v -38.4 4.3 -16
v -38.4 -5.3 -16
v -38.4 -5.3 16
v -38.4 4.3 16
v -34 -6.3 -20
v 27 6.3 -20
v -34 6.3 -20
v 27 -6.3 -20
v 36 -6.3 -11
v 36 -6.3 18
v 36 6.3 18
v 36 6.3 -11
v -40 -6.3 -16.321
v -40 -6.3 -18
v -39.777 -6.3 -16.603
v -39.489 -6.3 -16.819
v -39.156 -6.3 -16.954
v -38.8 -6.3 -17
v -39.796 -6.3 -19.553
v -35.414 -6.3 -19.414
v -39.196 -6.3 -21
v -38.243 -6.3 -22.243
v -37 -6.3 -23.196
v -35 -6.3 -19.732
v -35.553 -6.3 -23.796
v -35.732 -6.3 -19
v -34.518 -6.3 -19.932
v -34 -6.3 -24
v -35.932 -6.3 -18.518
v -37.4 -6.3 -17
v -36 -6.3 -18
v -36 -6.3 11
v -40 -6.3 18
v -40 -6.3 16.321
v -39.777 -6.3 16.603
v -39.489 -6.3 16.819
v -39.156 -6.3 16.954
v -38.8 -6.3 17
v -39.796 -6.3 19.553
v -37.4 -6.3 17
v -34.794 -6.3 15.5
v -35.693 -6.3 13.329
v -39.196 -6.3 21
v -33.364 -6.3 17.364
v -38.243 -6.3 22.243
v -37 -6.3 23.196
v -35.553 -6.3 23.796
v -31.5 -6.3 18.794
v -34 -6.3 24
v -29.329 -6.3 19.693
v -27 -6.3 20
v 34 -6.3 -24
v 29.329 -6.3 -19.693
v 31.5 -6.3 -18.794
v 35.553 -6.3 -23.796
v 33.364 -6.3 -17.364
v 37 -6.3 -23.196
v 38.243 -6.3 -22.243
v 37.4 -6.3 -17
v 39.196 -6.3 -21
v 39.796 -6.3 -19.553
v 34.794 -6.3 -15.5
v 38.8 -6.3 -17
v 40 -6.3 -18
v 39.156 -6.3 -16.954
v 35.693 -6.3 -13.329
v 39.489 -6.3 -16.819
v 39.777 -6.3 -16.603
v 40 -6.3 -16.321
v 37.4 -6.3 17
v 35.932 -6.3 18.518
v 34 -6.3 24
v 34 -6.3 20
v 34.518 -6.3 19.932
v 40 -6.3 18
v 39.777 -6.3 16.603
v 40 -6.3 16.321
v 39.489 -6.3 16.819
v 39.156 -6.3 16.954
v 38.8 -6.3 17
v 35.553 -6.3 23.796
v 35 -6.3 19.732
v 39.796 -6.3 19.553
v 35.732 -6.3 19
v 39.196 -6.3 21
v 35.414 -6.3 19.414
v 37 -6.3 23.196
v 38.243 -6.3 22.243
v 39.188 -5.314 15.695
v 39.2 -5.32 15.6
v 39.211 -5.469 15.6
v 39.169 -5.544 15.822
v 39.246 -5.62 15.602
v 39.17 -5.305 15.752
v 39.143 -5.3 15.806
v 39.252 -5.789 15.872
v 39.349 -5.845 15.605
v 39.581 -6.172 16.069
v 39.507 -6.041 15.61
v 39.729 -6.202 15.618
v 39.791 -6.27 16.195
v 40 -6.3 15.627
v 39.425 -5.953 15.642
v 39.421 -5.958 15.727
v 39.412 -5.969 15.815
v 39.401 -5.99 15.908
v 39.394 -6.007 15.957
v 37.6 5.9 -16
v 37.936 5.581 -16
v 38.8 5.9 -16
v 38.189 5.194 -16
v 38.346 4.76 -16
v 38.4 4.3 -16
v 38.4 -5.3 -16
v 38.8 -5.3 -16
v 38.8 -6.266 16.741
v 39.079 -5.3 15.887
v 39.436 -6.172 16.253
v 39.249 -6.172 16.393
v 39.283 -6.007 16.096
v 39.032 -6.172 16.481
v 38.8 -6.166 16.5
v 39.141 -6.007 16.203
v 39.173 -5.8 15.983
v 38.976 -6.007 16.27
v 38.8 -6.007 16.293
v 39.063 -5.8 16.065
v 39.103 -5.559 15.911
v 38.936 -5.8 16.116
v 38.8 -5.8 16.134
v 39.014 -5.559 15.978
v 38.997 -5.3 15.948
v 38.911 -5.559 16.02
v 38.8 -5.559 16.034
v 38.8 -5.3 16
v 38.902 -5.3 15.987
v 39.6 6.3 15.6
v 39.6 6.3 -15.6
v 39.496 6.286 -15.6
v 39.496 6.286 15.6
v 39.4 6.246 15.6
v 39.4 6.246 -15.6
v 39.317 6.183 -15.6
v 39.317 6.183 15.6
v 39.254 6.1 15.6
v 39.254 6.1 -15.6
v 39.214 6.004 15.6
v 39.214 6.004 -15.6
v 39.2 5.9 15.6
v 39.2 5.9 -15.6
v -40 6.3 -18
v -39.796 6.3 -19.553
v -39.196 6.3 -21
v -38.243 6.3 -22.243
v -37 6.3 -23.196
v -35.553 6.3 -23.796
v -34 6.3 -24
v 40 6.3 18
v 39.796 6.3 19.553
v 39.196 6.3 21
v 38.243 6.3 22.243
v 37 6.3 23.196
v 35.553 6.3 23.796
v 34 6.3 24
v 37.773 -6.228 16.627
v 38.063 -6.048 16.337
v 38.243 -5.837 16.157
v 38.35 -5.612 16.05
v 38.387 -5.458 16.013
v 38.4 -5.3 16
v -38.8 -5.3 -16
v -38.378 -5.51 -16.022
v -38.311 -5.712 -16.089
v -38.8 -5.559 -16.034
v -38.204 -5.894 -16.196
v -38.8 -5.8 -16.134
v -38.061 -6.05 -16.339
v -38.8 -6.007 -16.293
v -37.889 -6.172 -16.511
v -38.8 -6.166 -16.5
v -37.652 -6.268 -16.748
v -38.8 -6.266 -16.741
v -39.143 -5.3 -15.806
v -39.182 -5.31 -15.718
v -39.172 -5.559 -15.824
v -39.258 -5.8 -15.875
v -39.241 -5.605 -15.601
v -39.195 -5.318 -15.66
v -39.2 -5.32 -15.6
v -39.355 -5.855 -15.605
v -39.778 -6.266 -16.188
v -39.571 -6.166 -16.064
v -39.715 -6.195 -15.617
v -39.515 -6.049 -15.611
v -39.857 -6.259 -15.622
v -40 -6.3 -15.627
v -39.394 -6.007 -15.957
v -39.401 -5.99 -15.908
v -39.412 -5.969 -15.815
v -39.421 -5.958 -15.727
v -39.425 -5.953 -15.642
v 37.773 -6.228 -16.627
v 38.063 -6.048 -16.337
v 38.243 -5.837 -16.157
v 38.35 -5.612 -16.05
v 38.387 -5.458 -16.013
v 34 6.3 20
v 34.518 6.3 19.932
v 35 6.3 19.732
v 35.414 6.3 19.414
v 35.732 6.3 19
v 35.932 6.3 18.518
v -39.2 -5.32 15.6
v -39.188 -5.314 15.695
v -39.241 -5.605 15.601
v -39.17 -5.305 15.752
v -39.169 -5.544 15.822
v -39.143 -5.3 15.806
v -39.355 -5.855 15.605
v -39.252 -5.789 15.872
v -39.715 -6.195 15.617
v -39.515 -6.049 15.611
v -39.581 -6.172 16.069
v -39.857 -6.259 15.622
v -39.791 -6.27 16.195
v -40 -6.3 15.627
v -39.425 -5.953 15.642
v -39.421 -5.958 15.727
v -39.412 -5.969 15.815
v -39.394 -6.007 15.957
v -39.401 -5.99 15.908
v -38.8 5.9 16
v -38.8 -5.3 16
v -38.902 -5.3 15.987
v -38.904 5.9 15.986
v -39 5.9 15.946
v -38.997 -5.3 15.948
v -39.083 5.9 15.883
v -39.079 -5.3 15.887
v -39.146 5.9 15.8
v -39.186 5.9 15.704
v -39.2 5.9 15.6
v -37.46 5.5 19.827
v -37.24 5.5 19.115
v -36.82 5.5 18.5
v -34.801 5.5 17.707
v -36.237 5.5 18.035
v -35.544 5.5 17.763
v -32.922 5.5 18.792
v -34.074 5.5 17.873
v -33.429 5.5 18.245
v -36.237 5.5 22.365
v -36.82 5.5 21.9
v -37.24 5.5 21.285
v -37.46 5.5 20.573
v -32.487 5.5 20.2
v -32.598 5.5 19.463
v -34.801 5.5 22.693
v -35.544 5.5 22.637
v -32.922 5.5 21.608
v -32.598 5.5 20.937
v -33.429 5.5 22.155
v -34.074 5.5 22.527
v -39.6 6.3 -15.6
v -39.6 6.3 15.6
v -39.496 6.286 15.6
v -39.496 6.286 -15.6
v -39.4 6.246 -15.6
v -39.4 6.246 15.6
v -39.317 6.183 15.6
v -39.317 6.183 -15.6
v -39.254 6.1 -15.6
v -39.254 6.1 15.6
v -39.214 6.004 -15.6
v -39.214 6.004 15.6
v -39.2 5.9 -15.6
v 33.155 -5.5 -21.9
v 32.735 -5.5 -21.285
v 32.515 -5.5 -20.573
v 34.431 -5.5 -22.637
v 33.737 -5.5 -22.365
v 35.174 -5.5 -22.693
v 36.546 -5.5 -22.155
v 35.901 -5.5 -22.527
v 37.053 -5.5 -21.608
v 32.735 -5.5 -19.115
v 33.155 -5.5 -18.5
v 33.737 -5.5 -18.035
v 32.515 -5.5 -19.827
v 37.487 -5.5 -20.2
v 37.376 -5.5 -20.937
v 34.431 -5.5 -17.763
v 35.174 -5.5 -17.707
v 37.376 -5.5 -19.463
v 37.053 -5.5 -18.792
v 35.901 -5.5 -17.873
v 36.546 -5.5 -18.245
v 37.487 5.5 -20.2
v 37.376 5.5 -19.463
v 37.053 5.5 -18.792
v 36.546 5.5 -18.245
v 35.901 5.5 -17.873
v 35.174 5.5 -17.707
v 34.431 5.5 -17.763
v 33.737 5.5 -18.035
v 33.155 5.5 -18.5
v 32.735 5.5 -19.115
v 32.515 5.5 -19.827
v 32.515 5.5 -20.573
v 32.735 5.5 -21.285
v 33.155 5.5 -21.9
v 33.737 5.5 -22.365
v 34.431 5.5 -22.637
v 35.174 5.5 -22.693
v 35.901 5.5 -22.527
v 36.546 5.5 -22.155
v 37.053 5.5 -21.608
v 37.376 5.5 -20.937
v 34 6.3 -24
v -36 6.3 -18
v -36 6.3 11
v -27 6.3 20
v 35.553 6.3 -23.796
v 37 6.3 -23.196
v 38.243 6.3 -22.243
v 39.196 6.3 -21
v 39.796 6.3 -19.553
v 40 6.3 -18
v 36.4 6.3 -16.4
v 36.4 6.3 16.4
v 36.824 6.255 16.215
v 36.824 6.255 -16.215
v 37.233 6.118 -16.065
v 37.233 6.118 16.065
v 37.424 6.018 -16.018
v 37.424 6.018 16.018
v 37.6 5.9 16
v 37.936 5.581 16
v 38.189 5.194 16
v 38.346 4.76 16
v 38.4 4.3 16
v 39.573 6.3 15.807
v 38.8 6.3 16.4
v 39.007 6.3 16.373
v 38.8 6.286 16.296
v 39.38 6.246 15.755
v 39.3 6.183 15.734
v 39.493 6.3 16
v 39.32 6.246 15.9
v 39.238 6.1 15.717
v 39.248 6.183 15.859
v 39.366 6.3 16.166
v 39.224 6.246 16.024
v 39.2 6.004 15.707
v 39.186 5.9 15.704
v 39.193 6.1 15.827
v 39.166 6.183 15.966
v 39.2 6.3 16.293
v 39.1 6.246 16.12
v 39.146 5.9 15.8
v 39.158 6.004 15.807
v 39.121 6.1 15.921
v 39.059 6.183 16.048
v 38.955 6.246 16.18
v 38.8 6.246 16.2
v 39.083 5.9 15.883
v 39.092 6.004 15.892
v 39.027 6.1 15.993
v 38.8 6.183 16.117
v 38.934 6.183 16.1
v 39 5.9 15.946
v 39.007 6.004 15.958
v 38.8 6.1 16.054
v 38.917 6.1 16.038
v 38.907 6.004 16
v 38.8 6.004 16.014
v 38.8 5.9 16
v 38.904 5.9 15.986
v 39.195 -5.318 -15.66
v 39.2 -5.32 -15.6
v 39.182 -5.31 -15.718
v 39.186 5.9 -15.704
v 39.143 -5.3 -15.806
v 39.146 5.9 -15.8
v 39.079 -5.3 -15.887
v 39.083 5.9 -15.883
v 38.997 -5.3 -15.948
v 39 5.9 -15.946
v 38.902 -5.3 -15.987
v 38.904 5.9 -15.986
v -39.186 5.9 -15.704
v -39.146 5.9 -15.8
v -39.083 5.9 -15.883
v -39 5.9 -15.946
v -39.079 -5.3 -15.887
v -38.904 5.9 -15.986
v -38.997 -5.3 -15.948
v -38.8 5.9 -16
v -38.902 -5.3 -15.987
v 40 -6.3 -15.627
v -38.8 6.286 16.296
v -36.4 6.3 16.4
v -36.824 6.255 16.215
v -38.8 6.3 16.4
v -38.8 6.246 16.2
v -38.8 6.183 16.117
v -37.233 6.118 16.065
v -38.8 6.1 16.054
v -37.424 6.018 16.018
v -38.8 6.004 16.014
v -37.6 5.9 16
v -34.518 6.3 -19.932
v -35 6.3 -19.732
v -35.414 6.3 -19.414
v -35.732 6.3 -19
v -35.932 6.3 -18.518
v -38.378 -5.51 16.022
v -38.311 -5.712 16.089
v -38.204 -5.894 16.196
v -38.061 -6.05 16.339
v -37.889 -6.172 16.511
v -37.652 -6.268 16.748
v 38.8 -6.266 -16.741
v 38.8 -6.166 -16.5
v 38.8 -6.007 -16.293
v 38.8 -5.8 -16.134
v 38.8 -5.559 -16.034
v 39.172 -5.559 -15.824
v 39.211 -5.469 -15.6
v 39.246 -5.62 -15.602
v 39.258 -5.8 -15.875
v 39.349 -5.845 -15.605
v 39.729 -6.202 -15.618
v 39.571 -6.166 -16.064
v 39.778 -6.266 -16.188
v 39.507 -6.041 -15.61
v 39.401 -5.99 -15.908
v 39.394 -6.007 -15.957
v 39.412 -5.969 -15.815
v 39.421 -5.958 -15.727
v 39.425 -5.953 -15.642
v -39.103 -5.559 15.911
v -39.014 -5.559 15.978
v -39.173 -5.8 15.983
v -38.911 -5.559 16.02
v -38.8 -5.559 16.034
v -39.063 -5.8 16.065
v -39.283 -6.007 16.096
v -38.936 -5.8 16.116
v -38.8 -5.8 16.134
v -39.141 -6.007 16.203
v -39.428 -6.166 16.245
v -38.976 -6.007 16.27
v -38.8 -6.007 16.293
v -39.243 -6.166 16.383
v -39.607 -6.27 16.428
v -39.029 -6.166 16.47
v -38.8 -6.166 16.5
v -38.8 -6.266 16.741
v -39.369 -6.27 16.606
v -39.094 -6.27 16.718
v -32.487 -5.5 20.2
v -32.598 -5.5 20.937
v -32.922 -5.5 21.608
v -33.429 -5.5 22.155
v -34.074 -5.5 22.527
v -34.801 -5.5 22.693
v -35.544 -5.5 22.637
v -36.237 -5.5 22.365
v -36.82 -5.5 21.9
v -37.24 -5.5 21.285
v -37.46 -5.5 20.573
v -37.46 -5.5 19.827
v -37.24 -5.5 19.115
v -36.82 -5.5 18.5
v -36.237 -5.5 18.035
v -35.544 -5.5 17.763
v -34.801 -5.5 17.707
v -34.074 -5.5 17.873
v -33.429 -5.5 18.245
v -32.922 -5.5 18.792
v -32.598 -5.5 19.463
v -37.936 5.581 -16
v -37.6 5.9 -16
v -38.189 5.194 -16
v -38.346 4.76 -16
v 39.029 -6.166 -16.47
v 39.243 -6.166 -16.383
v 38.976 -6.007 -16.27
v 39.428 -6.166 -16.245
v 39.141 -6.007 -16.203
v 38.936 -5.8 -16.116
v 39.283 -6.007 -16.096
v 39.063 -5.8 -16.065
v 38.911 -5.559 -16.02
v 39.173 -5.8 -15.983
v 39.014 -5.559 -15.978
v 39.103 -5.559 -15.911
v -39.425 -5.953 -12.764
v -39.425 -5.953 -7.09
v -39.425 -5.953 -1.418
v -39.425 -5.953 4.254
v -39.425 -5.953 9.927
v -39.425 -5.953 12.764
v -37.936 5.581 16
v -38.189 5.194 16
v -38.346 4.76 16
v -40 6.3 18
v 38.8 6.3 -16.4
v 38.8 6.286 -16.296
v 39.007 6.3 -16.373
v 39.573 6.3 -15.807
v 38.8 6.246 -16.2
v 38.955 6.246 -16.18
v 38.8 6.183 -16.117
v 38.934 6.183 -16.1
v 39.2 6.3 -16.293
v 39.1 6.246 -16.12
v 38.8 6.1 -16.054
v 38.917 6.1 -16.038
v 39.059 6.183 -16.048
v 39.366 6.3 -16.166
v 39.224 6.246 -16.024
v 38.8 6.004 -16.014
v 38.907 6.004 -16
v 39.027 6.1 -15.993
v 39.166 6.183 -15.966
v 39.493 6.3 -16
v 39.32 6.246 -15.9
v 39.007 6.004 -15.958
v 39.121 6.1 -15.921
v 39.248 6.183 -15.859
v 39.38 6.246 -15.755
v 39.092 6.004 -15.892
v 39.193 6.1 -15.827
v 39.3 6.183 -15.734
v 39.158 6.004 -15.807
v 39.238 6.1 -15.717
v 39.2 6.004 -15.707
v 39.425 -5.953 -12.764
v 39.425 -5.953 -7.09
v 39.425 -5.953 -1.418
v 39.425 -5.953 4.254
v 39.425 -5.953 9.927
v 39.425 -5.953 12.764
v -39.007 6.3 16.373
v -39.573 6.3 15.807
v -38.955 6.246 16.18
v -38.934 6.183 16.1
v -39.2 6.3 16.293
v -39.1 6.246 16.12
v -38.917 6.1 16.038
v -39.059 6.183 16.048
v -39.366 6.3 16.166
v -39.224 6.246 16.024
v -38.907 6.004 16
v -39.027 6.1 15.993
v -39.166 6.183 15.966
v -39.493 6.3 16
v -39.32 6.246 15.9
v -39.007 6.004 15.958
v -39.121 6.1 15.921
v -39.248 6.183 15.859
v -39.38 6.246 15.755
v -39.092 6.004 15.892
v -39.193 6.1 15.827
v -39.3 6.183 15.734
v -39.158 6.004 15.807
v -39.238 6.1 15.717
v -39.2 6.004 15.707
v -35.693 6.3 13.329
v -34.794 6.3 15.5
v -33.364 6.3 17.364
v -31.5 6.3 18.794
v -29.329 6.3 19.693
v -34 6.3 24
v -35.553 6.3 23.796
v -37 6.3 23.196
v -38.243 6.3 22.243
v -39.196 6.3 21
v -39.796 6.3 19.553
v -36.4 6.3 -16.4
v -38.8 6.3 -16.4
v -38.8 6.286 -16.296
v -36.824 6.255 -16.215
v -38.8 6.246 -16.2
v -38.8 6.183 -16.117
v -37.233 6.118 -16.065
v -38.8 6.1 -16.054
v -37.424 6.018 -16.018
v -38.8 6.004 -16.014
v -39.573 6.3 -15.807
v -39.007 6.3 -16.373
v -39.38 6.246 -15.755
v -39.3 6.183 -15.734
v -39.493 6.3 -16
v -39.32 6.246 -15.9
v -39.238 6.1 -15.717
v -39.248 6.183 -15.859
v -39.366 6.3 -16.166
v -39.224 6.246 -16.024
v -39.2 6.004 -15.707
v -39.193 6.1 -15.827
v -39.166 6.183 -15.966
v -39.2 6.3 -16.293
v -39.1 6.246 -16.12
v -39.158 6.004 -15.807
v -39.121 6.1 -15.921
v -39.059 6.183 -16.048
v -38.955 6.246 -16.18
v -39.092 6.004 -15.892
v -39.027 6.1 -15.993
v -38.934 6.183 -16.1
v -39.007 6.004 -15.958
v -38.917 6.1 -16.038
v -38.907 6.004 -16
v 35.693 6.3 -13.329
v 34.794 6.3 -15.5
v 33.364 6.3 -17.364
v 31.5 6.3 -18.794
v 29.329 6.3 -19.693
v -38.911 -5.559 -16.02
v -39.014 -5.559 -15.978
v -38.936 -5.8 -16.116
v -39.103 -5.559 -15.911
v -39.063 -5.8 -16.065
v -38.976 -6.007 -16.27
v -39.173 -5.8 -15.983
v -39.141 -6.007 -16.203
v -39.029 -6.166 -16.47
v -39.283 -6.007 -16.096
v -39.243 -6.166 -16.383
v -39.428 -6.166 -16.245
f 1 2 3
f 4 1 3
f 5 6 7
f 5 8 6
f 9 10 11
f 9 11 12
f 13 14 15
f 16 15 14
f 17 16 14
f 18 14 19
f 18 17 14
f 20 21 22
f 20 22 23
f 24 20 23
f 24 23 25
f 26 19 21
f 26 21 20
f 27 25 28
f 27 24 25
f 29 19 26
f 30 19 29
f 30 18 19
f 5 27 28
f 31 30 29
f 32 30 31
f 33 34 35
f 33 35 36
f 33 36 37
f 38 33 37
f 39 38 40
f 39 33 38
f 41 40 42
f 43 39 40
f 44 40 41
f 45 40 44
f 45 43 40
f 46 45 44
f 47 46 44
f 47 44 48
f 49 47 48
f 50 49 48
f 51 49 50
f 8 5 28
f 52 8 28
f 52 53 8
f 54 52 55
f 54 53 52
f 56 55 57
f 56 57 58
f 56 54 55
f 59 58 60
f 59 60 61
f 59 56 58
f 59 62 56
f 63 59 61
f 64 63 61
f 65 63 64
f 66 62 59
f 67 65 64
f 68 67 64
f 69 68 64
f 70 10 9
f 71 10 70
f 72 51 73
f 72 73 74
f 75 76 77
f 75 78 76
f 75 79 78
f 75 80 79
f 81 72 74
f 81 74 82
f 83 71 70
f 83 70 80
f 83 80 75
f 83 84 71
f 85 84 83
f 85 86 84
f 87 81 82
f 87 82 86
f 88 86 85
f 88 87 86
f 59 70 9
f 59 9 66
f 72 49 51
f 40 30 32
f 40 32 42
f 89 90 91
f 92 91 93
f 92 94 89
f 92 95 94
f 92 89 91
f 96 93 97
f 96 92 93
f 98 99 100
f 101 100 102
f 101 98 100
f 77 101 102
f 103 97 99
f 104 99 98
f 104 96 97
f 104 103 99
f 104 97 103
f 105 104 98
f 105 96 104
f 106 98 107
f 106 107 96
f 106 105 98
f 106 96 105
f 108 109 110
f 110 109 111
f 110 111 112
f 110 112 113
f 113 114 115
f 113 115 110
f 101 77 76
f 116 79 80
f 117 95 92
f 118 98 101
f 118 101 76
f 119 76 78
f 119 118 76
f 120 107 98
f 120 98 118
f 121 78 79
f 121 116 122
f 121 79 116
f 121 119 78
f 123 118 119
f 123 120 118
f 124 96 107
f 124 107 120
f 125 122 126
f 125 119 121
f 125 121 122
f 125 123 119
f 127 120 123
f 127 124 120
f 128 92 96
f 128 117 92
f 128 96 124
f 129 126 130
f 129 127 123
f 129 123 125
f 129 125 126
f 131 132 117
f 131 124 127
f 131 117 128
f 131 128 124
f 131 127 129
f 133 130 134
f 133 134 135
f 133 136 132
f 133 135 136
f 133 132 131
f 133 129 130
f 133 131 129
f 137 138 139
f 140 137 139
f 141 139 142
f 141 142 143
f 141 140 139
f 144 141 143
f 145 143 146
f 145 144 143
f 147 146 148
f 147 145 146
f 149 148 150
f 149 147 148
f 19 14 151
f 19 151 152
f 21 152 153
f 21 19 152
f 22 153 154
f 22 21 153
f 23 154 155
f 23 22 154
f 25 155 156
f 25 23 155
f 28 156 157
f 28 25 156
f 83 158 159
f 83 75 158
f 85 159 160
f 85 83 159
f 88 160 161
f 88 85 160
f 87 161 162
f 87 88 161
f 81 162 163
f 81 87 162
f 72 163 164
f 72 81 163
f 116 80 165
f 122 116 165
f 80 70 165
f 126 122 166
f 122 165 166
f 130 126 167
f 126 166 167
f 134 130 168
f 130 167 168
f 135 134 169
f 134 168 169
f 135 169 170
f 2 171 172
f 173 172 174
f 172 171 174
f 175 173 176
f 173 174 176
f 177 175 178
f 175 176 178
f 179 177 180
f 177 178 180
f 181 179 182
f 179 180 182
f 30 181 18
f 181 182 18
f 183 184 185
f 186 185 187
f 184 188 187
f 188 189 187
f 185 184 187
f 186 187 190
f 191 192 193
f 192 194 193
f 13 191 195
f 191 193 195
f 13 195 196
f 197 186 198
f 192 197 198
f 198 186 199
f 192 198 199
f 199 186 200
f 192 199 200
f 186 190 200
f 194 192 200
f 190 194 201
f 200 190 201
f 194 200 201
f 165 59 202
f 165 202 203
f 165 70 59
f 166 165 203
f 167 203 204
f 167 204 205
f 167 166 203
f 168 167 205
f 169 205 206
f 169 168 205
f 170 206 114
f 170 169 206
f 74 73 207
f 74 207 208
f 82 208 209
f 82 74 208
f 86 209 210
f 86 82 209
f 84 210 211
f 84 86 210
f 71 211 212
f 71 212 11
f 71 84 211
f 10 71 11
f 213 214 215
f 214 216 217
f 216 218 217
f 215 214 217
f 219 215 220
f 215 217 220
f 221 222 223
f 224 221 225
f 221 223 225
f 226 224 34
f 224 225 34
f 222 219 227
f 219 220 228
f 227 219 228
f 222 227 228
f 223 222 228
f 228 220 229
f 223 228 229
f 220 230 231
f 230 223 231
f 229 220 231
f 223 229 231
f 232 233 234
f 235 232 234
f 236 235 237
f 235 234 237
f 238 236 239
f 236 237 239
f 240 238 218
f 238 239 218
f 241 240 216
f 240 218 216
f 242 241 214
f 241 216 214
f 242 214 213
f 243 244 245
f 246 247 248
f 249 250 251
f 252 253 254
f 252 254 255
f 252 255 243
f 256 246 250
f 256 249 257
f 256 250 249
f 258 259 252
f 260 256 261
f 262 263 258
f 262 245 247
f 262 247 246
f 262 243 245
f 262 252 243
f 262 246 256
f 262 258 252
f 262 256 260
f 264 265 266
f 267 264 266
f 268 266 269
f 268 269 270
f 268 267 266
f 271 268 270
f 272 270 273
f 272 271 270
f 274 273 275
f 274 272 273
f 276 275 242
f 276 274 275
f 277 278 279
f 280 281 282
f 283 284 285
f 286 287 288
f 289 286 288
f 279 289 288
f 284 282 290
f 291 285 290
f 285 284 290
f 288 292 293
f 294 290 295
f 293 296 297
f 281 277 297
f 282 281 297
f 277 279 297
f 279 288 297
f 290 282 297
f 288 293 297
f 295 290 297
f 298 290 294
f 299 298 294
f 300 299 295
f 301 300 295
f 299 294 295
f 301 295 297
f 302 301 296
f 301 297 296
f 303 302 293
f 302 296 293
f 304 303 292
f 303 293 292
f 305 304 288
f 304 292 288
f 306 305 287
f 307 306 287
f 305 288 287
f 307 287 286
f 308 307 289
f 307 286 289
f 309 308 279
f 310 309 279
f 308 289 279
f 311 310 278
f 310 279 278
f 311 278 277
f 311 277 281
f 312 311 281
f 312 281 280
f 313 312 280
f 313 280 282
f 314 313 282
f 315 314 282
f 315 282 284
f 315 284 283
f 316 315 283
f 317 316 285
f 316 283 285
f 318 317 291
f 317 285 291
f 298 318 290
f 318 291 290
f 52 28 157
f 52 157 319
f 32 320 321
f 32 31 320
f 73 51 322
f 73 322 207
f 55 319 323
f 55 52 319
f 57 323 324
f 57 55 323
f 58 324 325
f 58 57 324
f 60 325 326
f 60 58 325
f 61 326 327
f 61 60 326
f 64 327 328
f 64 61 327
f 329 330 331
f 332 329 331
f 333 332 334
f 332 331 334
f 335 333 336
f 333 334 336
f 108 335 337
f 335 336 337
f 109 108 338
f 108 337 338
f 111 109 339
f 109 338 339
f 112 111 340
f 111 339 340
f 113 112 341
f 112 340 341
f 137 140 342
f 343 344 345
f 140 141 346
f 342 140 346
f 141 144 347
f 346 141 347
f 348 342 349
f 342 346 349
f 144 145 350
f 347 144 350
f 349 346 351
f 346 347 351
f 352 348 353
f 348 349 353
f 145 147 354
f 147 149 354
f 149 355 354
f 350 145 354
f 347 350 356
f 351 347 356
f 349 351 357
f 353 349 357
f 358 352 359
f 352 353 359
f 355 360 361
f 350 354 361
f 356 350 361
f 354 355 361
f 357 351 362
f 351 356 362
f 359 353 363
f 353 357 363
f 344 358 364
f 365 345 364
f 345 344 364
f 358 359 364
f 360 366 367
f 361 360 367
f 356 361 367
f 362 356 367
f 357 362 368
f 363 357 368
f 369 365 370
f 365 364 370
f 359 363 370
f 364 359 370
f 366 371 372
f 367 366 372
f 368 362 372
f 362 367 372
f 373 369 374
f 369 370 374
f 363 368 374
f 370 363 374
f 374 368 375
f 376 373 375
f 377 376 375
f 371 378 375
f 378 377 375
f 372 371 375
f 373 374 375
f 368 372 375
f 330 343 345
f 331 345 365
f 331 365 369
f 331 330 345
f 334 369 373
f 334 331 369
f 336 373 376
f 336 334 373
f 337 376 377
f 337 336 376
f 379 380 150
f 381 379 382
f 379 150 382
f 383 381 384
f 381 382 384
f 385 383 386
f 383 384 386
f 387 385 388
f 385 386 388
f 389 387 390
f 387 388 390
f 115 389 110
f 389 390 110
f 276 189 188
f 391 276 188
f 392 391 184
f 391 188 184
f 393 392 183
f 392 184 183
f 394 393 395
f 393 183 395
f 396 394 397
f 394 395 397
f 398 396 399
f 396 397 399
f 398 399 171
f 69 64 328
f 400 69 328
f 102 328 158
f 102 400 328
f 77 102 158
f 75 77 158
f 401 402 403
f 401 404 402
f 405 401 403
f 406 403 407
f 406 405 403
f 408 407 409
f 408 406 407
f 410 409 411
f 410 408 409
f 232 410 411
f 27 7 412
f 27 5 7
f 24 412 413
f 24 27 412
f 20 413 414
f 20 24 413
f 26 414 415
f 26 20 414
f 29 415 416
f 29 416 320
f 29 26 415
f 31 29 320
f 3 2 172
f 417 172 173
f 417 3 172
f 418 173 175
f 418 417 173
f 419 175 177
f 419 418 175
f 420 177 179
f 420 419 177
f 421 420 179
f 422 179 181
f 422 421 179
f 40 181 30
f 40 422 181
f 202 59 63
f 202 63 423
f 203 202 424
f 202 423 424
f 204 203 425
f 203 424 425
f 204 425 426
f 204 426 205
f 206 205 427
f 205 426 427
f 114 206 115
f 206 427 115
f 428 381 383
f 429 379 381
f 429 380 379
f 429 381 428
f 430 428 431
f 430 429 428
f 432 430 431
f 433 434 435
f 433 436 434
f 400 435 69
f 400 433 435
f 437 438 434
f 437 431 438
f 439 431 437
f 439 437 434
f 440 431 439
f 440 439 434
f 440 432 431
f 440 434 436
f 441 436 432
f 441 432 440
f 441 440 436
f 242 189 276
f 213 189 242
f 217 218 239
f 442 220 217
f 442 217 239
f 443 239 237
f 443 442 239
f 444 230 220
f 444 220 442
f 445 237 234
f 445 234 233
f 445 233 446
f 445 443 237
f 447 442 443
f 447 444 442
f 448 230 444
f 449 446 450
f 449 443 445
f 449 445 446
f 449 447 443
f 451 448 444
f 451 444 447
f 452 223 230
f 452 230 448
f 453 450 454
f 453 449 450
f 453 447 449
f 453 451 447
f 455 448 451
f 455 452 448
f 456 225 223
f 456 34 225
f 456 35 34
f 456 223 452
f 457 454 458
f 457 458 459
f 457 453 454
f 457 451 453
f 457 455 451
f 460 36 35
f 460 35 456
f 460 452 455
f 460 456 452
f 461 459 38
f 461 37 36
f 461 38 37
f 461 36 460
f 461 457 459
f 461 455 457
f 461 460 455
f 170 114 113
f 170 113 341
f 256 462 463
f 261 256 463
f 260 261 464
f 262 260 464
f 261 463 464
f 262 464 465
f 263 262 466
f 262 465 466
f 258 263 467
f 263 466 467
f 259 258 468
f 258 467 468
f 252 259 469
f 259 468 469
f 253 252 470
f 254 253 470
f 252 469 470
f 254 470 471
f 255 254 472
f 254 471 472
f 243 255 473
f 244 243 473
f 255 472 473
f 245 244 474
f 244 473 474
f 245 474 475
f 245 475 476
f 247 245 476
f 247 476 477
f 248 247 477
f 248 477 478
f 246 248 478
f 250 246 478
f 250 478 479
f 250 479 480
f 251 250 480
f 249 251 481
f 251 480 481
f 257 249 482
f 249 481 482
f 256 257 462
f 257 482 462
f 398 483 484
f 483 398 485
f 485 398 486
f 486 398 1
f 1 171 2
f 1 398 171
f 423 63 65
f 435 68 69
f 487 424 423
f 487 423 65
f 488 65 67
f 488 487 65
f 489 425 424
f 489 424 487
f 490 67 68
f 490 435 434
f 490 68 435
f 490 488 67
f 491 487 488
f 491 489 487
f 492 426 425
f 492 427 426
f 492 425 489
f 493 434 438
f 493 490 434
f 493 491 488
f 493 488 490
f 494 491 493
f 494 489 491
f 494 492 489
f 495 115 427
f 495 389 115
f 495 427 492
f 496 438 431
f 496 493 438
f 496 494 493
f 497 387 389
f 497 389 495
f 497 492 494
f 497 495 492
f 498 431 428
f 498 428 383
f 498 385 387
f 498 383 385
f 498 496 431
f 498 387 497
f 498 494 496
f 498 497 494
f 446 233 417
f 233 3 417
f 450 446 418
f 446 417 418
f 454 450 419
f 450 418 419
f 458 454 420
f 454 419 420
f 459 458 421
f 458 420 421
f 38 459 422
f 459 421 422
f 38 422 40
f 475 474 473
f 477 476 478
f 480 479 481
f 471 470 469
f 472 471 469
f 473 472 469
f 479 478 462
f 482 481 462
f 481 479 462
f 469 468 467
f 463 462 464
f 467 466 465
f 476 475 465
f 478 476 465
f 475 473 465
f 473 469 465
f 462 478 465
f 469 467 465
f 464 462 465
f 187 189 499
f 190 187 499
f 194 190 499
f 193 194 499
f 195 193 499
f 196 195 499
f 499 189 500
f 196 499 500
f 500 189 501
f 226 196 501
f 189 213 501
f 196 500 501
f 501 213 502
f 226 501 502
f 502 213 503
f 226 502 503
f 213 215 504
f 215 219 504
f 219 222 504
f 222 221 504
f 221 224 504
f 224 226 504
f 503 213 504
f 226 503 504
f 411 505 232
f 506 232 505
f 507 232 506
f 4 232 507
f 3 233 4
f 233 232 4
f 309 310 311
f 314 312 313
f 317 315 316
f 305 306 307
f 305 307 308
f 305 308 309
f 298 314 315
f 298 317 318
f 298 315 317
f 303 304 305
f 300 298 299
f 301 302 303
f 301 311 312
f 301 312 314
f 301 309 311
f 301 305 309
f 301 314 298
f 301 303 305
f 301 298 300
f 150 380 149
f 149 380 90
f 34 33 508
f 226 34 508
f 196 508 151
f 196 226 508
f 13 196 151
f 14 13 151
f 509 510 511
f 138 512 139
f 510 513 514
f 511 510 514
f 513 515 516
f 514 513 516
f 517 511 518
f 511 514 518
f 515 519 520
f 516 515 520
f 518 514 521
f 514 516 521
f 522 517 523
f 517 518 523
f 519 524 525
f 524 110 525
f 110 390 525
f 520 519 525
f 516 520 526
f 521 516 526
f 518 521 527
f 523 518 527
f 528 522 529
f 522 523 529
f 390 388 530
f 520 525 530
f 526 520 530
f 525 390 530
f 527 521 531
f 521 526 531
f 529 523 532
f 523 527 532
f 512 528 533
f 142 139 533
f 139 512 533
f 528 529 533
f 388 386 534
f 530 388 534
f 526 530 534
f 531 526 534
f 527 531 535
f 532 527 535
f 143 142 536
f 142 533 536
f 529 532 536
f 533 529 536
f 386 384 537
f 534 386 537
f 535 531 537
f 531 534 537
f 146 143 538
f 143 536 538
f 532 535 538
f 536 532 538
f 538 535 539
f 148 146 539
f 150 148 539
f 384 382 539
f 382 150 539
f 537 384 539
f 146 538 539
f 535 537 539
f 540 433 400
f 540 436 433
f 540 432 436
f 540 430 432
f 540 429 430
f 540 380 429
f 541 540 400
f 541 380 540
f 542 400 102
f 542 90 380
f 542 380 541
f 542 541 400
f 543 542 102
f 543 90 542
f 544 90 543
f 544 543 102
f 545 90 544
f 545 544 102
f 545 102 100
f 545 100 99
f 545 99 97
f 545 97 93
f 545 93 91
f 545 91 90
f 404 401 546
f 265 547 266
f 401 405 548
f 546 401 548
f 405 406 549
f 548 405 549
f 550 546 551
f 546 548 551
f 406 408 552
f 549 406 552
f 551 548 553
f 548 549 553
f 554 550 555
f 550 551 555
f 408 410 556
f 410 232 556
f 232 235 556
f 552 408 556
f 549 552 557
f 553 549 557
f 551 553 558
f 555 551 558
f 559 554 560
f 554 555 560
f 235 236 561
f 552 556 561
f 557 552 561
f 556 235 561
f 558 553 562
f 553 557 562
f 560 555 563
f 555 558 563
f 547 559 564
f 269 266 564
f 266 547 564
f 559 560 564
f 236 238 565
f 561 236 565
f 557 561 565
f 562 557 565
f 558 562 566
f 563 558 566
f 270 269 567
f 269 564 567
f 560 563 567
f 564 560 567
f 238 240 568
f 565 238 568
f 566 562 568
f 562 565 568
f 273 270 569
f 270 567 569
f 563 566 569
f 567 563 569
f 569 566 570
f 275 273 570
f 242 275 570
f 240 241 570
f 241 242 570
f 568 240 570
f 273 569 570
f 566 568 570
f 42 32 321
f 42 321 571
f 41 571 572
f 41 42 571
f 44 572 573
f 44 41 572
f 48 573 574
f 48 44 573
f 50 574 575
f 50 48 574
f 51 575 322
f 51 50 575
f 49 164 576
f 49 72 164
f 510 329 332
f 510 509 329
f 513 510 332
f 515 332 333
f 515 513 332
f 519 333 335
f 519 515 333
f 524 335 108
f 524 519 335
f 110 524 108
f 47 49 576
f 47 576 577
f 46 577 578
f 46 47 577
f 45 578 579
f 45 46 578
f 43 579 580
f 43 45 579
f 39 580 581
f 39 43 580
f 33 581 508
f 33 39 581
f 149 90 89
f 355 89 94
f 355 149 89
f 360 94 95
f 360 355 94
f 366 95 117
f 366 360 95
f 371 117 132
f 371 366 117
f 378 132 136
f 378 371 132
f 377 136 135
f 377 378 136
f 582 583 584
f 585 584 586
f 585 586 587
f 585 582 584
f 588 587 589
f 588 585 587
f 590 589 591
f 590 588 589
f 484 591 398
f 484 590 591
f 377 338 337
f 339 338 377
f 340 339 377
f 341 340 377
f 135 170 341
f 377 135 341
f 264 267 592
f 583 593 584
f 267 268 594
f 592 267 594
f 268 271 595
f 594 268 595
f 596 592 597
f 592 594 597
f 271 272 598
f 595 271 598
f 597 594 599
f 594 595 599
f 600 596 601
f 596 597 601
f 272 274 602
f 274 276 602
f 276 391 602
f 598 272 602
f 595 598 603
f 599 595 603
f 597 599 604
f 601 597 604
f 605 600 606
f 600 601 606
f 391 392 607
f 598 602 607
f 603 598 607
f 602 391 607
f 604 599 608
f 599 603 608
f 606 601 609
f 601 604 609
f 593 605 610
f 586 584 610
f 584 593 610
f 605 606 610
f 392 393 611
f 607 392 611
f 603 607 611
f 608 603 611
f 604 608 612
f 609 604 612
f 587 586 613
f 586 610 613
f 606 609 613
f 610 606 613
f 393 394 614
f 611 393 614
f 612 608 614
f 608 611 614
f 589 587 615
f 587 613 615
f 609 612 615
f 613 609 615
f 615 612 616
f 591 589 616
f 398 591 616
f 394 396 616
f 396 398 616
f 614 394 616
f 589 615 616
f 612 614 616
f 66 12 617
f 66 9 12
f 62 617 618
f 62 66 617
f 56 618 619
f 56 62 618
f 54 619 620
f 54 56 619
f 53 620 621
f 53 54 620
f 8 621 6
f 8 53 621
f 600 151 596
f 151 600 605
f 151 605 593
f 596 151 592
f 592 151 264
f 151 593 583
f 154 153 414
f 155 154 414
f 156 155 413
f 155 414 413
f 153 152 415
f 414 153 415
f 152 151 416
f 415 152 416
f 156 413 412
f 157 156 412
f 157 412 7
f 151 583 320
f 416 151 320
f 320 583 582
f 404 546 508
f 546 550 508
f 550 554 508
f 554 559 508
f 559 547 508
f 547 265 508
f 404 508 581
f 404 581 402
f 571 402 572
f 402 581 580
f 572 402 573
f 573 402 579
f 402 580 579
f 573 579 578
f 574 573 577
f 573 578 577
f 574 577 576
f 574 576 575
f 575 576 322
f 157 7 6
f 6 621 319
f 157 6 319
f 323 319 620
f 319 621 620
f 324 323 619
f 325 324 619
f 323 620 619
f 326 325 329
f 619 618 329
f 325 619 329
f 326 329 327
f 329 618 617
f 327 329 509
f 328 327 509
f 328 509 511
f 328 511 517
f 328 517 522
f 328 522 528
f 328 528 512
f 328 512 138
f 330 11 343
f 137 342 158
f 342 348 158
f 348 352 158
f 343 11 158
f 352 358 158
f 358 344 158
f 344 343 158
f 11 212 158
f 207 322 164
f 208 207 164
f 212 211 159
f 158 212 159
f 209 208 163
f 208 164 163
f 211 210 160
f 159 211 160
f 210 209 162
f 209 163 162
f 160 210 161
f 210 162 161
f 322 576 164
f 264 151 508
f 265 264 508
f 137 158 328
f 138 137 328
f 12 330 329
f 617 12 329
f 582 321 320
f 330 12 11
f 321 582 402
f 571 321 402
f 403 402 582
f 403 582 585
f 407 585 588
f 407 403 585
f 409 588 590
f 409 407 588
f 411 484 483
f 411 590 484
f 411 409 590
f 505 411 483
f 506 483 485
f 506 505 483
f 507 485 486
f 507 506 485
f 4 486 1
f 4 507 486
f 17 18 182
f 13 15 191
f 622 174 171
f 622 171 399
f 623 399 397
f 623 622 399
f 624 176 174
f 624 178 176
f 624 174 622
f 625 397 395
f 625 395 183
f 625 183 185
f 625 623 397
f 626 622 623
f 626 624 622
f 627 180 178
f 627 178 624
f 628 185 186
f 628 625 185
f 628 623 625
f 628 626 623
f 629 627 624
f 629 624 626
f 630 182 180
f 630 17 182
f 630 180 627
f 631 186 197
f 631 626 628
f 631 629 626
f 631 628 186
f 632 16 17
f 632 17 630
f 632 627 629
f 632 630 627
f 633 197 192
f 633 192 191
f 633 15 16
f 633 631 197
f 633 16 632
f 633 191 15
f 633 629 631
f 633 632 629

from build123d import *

# Parameters (mm, degrees)
F0_W     = 0.8
F0_H     = 32
F1_DEPTH = 6.3
F3_R     = 2.5
F4_DEPTH = 11
F5_R     = 2
F6_F1_R  = 0.4
F6_F2_R  = 0.4
F7_R     = 1


# Not quite as in the source:
# - a feature names something its author has since deleted; it is built from what else it names


with BuildPart() as f1:
    # F0 (on Front) → F1 (new body, symmetric)
    with BuildSketch(Plane.XZ):
        with BuildLine():
            Line((34, 24), (-34, 24))
            ThreePointArc((-34, 24), (-38.2426406871, 22.2426406871), (-40, 18))
            Line((-40, 18), (-40, -18))
            ThreePointArc((-40, -18), (-38.2426406871, -22.2426406871), (-34, -24))
            Line((-34, -24), (34, -24))
            ThreePointArc((34, -24), (38.2426406871, -22.2426406871), (40, -18))
            Line((40, -18), (40, 18))
            ThreePointArc((40, 18), (38.2426406871, 22.2426406871), (34, 24))
        make_face()
        with Locations((-38.8, 0)):
            Rectangle(F0_W, F0_H, mode=Mode.SUBTRACT)
        with BuildLine():
            ThreePointArc((-36, 11), (-33.3639610307, 17.3639610307), (-27, 20))
            Line((-27, 20), (34, 20))
            ThreePointArc((34, 20), (35.4142135624, 19.4142135624), (36, 18))
            Line((36, 18), (36, -11))
            ThreePointArc((36, -11), (33.3639610307, -17.3639610307), (27, -20))
            Line((27, -20), (-34, -20))
            ThreePointArc((-34, -20), (-35.4142135624, -19.4142135624), (-36, -18))
            Line((-36, -18), (-36, 11))
        make_face(mode=Mode.SUBTRACT)
        with Locations((38.8, 0)):
            Rectangle(F0_W, F0_H, mode=Mode.SUBTRACT)
    extrude(amount=F1_DEPTH, both=True)

    # F3 (on offset) → F4 (cut)
    with BuildSketch(Plane.XZ.offset(5.5)):
        with Locations((-34.9874263129, 20.2)):
            Circle(F3_R)
        with Locations((34.9874263129, -20.2)):
            Circle(F3_R)
    extrude(amount=-F4_DEPTH, mode=Mode.SUBTRACT)

    # F5
    f5_edges = [f1.edges().sort_by_distance(p)[0] for p in [
        (-38.4, 6.3, 0),
        (38.4, 6.3, 0),
    ]]
    fillet(f5_edges, radius=F5_R)

    # F6: fillet of radius 0.4 on 8 edges, made by hand

    # F6_f1
    f6_f1_edges = [f1.edges().sort_by_distance(p)[0] for p in [
        (-39.2, 0, 16),
        (-39.2, 0, -16),
        (39.2, 0, -16),
        (39.2, 0, 16),
    ]]
    fillet(f6_f1_edges, radius=F6_F1_R)

    # F6_f2
    f6_f2_edges = [f1.edges().sort_by_distance(p)[0] for p in [
        (38.6, 6.3, 16),
        (-38.6, 6.3, 16),
        (-39.2, 6.3, 0),
        (39.2, 6.3, 0),
        (-37.4, 6.3, 16),
        (37.4, 6.3, 16),
        (39.0828427125, 6.3, 15.8828427125),
        (39.0828427125, 6.3, -15.8828427125),
        (-39.0828427125, 6.3, -15.8828427125),
        (-39.0828427125, 6.3, 15.8828427125),
    ]]
    fillet(f6_f2_edges, radius=F6_F2_R)

    # F7
    f7_edges = [f1.edges().sort_by_distance(p)[0] for p in [
        (38.4, -6.3, 0),
        (39.2, -6.3, 0),
        (-38.4, -6.3, 0),
        (-39.2, -6.3, 0),
        (38.6, -6.3, -16),
        (38.6, -6.3, 16),
        (-38.6, -6.3, -16),
        (-38.6, -6.3, 16),
    ]]
    fillet(f7_edges, radius=F7_R)


solid = f1.part
